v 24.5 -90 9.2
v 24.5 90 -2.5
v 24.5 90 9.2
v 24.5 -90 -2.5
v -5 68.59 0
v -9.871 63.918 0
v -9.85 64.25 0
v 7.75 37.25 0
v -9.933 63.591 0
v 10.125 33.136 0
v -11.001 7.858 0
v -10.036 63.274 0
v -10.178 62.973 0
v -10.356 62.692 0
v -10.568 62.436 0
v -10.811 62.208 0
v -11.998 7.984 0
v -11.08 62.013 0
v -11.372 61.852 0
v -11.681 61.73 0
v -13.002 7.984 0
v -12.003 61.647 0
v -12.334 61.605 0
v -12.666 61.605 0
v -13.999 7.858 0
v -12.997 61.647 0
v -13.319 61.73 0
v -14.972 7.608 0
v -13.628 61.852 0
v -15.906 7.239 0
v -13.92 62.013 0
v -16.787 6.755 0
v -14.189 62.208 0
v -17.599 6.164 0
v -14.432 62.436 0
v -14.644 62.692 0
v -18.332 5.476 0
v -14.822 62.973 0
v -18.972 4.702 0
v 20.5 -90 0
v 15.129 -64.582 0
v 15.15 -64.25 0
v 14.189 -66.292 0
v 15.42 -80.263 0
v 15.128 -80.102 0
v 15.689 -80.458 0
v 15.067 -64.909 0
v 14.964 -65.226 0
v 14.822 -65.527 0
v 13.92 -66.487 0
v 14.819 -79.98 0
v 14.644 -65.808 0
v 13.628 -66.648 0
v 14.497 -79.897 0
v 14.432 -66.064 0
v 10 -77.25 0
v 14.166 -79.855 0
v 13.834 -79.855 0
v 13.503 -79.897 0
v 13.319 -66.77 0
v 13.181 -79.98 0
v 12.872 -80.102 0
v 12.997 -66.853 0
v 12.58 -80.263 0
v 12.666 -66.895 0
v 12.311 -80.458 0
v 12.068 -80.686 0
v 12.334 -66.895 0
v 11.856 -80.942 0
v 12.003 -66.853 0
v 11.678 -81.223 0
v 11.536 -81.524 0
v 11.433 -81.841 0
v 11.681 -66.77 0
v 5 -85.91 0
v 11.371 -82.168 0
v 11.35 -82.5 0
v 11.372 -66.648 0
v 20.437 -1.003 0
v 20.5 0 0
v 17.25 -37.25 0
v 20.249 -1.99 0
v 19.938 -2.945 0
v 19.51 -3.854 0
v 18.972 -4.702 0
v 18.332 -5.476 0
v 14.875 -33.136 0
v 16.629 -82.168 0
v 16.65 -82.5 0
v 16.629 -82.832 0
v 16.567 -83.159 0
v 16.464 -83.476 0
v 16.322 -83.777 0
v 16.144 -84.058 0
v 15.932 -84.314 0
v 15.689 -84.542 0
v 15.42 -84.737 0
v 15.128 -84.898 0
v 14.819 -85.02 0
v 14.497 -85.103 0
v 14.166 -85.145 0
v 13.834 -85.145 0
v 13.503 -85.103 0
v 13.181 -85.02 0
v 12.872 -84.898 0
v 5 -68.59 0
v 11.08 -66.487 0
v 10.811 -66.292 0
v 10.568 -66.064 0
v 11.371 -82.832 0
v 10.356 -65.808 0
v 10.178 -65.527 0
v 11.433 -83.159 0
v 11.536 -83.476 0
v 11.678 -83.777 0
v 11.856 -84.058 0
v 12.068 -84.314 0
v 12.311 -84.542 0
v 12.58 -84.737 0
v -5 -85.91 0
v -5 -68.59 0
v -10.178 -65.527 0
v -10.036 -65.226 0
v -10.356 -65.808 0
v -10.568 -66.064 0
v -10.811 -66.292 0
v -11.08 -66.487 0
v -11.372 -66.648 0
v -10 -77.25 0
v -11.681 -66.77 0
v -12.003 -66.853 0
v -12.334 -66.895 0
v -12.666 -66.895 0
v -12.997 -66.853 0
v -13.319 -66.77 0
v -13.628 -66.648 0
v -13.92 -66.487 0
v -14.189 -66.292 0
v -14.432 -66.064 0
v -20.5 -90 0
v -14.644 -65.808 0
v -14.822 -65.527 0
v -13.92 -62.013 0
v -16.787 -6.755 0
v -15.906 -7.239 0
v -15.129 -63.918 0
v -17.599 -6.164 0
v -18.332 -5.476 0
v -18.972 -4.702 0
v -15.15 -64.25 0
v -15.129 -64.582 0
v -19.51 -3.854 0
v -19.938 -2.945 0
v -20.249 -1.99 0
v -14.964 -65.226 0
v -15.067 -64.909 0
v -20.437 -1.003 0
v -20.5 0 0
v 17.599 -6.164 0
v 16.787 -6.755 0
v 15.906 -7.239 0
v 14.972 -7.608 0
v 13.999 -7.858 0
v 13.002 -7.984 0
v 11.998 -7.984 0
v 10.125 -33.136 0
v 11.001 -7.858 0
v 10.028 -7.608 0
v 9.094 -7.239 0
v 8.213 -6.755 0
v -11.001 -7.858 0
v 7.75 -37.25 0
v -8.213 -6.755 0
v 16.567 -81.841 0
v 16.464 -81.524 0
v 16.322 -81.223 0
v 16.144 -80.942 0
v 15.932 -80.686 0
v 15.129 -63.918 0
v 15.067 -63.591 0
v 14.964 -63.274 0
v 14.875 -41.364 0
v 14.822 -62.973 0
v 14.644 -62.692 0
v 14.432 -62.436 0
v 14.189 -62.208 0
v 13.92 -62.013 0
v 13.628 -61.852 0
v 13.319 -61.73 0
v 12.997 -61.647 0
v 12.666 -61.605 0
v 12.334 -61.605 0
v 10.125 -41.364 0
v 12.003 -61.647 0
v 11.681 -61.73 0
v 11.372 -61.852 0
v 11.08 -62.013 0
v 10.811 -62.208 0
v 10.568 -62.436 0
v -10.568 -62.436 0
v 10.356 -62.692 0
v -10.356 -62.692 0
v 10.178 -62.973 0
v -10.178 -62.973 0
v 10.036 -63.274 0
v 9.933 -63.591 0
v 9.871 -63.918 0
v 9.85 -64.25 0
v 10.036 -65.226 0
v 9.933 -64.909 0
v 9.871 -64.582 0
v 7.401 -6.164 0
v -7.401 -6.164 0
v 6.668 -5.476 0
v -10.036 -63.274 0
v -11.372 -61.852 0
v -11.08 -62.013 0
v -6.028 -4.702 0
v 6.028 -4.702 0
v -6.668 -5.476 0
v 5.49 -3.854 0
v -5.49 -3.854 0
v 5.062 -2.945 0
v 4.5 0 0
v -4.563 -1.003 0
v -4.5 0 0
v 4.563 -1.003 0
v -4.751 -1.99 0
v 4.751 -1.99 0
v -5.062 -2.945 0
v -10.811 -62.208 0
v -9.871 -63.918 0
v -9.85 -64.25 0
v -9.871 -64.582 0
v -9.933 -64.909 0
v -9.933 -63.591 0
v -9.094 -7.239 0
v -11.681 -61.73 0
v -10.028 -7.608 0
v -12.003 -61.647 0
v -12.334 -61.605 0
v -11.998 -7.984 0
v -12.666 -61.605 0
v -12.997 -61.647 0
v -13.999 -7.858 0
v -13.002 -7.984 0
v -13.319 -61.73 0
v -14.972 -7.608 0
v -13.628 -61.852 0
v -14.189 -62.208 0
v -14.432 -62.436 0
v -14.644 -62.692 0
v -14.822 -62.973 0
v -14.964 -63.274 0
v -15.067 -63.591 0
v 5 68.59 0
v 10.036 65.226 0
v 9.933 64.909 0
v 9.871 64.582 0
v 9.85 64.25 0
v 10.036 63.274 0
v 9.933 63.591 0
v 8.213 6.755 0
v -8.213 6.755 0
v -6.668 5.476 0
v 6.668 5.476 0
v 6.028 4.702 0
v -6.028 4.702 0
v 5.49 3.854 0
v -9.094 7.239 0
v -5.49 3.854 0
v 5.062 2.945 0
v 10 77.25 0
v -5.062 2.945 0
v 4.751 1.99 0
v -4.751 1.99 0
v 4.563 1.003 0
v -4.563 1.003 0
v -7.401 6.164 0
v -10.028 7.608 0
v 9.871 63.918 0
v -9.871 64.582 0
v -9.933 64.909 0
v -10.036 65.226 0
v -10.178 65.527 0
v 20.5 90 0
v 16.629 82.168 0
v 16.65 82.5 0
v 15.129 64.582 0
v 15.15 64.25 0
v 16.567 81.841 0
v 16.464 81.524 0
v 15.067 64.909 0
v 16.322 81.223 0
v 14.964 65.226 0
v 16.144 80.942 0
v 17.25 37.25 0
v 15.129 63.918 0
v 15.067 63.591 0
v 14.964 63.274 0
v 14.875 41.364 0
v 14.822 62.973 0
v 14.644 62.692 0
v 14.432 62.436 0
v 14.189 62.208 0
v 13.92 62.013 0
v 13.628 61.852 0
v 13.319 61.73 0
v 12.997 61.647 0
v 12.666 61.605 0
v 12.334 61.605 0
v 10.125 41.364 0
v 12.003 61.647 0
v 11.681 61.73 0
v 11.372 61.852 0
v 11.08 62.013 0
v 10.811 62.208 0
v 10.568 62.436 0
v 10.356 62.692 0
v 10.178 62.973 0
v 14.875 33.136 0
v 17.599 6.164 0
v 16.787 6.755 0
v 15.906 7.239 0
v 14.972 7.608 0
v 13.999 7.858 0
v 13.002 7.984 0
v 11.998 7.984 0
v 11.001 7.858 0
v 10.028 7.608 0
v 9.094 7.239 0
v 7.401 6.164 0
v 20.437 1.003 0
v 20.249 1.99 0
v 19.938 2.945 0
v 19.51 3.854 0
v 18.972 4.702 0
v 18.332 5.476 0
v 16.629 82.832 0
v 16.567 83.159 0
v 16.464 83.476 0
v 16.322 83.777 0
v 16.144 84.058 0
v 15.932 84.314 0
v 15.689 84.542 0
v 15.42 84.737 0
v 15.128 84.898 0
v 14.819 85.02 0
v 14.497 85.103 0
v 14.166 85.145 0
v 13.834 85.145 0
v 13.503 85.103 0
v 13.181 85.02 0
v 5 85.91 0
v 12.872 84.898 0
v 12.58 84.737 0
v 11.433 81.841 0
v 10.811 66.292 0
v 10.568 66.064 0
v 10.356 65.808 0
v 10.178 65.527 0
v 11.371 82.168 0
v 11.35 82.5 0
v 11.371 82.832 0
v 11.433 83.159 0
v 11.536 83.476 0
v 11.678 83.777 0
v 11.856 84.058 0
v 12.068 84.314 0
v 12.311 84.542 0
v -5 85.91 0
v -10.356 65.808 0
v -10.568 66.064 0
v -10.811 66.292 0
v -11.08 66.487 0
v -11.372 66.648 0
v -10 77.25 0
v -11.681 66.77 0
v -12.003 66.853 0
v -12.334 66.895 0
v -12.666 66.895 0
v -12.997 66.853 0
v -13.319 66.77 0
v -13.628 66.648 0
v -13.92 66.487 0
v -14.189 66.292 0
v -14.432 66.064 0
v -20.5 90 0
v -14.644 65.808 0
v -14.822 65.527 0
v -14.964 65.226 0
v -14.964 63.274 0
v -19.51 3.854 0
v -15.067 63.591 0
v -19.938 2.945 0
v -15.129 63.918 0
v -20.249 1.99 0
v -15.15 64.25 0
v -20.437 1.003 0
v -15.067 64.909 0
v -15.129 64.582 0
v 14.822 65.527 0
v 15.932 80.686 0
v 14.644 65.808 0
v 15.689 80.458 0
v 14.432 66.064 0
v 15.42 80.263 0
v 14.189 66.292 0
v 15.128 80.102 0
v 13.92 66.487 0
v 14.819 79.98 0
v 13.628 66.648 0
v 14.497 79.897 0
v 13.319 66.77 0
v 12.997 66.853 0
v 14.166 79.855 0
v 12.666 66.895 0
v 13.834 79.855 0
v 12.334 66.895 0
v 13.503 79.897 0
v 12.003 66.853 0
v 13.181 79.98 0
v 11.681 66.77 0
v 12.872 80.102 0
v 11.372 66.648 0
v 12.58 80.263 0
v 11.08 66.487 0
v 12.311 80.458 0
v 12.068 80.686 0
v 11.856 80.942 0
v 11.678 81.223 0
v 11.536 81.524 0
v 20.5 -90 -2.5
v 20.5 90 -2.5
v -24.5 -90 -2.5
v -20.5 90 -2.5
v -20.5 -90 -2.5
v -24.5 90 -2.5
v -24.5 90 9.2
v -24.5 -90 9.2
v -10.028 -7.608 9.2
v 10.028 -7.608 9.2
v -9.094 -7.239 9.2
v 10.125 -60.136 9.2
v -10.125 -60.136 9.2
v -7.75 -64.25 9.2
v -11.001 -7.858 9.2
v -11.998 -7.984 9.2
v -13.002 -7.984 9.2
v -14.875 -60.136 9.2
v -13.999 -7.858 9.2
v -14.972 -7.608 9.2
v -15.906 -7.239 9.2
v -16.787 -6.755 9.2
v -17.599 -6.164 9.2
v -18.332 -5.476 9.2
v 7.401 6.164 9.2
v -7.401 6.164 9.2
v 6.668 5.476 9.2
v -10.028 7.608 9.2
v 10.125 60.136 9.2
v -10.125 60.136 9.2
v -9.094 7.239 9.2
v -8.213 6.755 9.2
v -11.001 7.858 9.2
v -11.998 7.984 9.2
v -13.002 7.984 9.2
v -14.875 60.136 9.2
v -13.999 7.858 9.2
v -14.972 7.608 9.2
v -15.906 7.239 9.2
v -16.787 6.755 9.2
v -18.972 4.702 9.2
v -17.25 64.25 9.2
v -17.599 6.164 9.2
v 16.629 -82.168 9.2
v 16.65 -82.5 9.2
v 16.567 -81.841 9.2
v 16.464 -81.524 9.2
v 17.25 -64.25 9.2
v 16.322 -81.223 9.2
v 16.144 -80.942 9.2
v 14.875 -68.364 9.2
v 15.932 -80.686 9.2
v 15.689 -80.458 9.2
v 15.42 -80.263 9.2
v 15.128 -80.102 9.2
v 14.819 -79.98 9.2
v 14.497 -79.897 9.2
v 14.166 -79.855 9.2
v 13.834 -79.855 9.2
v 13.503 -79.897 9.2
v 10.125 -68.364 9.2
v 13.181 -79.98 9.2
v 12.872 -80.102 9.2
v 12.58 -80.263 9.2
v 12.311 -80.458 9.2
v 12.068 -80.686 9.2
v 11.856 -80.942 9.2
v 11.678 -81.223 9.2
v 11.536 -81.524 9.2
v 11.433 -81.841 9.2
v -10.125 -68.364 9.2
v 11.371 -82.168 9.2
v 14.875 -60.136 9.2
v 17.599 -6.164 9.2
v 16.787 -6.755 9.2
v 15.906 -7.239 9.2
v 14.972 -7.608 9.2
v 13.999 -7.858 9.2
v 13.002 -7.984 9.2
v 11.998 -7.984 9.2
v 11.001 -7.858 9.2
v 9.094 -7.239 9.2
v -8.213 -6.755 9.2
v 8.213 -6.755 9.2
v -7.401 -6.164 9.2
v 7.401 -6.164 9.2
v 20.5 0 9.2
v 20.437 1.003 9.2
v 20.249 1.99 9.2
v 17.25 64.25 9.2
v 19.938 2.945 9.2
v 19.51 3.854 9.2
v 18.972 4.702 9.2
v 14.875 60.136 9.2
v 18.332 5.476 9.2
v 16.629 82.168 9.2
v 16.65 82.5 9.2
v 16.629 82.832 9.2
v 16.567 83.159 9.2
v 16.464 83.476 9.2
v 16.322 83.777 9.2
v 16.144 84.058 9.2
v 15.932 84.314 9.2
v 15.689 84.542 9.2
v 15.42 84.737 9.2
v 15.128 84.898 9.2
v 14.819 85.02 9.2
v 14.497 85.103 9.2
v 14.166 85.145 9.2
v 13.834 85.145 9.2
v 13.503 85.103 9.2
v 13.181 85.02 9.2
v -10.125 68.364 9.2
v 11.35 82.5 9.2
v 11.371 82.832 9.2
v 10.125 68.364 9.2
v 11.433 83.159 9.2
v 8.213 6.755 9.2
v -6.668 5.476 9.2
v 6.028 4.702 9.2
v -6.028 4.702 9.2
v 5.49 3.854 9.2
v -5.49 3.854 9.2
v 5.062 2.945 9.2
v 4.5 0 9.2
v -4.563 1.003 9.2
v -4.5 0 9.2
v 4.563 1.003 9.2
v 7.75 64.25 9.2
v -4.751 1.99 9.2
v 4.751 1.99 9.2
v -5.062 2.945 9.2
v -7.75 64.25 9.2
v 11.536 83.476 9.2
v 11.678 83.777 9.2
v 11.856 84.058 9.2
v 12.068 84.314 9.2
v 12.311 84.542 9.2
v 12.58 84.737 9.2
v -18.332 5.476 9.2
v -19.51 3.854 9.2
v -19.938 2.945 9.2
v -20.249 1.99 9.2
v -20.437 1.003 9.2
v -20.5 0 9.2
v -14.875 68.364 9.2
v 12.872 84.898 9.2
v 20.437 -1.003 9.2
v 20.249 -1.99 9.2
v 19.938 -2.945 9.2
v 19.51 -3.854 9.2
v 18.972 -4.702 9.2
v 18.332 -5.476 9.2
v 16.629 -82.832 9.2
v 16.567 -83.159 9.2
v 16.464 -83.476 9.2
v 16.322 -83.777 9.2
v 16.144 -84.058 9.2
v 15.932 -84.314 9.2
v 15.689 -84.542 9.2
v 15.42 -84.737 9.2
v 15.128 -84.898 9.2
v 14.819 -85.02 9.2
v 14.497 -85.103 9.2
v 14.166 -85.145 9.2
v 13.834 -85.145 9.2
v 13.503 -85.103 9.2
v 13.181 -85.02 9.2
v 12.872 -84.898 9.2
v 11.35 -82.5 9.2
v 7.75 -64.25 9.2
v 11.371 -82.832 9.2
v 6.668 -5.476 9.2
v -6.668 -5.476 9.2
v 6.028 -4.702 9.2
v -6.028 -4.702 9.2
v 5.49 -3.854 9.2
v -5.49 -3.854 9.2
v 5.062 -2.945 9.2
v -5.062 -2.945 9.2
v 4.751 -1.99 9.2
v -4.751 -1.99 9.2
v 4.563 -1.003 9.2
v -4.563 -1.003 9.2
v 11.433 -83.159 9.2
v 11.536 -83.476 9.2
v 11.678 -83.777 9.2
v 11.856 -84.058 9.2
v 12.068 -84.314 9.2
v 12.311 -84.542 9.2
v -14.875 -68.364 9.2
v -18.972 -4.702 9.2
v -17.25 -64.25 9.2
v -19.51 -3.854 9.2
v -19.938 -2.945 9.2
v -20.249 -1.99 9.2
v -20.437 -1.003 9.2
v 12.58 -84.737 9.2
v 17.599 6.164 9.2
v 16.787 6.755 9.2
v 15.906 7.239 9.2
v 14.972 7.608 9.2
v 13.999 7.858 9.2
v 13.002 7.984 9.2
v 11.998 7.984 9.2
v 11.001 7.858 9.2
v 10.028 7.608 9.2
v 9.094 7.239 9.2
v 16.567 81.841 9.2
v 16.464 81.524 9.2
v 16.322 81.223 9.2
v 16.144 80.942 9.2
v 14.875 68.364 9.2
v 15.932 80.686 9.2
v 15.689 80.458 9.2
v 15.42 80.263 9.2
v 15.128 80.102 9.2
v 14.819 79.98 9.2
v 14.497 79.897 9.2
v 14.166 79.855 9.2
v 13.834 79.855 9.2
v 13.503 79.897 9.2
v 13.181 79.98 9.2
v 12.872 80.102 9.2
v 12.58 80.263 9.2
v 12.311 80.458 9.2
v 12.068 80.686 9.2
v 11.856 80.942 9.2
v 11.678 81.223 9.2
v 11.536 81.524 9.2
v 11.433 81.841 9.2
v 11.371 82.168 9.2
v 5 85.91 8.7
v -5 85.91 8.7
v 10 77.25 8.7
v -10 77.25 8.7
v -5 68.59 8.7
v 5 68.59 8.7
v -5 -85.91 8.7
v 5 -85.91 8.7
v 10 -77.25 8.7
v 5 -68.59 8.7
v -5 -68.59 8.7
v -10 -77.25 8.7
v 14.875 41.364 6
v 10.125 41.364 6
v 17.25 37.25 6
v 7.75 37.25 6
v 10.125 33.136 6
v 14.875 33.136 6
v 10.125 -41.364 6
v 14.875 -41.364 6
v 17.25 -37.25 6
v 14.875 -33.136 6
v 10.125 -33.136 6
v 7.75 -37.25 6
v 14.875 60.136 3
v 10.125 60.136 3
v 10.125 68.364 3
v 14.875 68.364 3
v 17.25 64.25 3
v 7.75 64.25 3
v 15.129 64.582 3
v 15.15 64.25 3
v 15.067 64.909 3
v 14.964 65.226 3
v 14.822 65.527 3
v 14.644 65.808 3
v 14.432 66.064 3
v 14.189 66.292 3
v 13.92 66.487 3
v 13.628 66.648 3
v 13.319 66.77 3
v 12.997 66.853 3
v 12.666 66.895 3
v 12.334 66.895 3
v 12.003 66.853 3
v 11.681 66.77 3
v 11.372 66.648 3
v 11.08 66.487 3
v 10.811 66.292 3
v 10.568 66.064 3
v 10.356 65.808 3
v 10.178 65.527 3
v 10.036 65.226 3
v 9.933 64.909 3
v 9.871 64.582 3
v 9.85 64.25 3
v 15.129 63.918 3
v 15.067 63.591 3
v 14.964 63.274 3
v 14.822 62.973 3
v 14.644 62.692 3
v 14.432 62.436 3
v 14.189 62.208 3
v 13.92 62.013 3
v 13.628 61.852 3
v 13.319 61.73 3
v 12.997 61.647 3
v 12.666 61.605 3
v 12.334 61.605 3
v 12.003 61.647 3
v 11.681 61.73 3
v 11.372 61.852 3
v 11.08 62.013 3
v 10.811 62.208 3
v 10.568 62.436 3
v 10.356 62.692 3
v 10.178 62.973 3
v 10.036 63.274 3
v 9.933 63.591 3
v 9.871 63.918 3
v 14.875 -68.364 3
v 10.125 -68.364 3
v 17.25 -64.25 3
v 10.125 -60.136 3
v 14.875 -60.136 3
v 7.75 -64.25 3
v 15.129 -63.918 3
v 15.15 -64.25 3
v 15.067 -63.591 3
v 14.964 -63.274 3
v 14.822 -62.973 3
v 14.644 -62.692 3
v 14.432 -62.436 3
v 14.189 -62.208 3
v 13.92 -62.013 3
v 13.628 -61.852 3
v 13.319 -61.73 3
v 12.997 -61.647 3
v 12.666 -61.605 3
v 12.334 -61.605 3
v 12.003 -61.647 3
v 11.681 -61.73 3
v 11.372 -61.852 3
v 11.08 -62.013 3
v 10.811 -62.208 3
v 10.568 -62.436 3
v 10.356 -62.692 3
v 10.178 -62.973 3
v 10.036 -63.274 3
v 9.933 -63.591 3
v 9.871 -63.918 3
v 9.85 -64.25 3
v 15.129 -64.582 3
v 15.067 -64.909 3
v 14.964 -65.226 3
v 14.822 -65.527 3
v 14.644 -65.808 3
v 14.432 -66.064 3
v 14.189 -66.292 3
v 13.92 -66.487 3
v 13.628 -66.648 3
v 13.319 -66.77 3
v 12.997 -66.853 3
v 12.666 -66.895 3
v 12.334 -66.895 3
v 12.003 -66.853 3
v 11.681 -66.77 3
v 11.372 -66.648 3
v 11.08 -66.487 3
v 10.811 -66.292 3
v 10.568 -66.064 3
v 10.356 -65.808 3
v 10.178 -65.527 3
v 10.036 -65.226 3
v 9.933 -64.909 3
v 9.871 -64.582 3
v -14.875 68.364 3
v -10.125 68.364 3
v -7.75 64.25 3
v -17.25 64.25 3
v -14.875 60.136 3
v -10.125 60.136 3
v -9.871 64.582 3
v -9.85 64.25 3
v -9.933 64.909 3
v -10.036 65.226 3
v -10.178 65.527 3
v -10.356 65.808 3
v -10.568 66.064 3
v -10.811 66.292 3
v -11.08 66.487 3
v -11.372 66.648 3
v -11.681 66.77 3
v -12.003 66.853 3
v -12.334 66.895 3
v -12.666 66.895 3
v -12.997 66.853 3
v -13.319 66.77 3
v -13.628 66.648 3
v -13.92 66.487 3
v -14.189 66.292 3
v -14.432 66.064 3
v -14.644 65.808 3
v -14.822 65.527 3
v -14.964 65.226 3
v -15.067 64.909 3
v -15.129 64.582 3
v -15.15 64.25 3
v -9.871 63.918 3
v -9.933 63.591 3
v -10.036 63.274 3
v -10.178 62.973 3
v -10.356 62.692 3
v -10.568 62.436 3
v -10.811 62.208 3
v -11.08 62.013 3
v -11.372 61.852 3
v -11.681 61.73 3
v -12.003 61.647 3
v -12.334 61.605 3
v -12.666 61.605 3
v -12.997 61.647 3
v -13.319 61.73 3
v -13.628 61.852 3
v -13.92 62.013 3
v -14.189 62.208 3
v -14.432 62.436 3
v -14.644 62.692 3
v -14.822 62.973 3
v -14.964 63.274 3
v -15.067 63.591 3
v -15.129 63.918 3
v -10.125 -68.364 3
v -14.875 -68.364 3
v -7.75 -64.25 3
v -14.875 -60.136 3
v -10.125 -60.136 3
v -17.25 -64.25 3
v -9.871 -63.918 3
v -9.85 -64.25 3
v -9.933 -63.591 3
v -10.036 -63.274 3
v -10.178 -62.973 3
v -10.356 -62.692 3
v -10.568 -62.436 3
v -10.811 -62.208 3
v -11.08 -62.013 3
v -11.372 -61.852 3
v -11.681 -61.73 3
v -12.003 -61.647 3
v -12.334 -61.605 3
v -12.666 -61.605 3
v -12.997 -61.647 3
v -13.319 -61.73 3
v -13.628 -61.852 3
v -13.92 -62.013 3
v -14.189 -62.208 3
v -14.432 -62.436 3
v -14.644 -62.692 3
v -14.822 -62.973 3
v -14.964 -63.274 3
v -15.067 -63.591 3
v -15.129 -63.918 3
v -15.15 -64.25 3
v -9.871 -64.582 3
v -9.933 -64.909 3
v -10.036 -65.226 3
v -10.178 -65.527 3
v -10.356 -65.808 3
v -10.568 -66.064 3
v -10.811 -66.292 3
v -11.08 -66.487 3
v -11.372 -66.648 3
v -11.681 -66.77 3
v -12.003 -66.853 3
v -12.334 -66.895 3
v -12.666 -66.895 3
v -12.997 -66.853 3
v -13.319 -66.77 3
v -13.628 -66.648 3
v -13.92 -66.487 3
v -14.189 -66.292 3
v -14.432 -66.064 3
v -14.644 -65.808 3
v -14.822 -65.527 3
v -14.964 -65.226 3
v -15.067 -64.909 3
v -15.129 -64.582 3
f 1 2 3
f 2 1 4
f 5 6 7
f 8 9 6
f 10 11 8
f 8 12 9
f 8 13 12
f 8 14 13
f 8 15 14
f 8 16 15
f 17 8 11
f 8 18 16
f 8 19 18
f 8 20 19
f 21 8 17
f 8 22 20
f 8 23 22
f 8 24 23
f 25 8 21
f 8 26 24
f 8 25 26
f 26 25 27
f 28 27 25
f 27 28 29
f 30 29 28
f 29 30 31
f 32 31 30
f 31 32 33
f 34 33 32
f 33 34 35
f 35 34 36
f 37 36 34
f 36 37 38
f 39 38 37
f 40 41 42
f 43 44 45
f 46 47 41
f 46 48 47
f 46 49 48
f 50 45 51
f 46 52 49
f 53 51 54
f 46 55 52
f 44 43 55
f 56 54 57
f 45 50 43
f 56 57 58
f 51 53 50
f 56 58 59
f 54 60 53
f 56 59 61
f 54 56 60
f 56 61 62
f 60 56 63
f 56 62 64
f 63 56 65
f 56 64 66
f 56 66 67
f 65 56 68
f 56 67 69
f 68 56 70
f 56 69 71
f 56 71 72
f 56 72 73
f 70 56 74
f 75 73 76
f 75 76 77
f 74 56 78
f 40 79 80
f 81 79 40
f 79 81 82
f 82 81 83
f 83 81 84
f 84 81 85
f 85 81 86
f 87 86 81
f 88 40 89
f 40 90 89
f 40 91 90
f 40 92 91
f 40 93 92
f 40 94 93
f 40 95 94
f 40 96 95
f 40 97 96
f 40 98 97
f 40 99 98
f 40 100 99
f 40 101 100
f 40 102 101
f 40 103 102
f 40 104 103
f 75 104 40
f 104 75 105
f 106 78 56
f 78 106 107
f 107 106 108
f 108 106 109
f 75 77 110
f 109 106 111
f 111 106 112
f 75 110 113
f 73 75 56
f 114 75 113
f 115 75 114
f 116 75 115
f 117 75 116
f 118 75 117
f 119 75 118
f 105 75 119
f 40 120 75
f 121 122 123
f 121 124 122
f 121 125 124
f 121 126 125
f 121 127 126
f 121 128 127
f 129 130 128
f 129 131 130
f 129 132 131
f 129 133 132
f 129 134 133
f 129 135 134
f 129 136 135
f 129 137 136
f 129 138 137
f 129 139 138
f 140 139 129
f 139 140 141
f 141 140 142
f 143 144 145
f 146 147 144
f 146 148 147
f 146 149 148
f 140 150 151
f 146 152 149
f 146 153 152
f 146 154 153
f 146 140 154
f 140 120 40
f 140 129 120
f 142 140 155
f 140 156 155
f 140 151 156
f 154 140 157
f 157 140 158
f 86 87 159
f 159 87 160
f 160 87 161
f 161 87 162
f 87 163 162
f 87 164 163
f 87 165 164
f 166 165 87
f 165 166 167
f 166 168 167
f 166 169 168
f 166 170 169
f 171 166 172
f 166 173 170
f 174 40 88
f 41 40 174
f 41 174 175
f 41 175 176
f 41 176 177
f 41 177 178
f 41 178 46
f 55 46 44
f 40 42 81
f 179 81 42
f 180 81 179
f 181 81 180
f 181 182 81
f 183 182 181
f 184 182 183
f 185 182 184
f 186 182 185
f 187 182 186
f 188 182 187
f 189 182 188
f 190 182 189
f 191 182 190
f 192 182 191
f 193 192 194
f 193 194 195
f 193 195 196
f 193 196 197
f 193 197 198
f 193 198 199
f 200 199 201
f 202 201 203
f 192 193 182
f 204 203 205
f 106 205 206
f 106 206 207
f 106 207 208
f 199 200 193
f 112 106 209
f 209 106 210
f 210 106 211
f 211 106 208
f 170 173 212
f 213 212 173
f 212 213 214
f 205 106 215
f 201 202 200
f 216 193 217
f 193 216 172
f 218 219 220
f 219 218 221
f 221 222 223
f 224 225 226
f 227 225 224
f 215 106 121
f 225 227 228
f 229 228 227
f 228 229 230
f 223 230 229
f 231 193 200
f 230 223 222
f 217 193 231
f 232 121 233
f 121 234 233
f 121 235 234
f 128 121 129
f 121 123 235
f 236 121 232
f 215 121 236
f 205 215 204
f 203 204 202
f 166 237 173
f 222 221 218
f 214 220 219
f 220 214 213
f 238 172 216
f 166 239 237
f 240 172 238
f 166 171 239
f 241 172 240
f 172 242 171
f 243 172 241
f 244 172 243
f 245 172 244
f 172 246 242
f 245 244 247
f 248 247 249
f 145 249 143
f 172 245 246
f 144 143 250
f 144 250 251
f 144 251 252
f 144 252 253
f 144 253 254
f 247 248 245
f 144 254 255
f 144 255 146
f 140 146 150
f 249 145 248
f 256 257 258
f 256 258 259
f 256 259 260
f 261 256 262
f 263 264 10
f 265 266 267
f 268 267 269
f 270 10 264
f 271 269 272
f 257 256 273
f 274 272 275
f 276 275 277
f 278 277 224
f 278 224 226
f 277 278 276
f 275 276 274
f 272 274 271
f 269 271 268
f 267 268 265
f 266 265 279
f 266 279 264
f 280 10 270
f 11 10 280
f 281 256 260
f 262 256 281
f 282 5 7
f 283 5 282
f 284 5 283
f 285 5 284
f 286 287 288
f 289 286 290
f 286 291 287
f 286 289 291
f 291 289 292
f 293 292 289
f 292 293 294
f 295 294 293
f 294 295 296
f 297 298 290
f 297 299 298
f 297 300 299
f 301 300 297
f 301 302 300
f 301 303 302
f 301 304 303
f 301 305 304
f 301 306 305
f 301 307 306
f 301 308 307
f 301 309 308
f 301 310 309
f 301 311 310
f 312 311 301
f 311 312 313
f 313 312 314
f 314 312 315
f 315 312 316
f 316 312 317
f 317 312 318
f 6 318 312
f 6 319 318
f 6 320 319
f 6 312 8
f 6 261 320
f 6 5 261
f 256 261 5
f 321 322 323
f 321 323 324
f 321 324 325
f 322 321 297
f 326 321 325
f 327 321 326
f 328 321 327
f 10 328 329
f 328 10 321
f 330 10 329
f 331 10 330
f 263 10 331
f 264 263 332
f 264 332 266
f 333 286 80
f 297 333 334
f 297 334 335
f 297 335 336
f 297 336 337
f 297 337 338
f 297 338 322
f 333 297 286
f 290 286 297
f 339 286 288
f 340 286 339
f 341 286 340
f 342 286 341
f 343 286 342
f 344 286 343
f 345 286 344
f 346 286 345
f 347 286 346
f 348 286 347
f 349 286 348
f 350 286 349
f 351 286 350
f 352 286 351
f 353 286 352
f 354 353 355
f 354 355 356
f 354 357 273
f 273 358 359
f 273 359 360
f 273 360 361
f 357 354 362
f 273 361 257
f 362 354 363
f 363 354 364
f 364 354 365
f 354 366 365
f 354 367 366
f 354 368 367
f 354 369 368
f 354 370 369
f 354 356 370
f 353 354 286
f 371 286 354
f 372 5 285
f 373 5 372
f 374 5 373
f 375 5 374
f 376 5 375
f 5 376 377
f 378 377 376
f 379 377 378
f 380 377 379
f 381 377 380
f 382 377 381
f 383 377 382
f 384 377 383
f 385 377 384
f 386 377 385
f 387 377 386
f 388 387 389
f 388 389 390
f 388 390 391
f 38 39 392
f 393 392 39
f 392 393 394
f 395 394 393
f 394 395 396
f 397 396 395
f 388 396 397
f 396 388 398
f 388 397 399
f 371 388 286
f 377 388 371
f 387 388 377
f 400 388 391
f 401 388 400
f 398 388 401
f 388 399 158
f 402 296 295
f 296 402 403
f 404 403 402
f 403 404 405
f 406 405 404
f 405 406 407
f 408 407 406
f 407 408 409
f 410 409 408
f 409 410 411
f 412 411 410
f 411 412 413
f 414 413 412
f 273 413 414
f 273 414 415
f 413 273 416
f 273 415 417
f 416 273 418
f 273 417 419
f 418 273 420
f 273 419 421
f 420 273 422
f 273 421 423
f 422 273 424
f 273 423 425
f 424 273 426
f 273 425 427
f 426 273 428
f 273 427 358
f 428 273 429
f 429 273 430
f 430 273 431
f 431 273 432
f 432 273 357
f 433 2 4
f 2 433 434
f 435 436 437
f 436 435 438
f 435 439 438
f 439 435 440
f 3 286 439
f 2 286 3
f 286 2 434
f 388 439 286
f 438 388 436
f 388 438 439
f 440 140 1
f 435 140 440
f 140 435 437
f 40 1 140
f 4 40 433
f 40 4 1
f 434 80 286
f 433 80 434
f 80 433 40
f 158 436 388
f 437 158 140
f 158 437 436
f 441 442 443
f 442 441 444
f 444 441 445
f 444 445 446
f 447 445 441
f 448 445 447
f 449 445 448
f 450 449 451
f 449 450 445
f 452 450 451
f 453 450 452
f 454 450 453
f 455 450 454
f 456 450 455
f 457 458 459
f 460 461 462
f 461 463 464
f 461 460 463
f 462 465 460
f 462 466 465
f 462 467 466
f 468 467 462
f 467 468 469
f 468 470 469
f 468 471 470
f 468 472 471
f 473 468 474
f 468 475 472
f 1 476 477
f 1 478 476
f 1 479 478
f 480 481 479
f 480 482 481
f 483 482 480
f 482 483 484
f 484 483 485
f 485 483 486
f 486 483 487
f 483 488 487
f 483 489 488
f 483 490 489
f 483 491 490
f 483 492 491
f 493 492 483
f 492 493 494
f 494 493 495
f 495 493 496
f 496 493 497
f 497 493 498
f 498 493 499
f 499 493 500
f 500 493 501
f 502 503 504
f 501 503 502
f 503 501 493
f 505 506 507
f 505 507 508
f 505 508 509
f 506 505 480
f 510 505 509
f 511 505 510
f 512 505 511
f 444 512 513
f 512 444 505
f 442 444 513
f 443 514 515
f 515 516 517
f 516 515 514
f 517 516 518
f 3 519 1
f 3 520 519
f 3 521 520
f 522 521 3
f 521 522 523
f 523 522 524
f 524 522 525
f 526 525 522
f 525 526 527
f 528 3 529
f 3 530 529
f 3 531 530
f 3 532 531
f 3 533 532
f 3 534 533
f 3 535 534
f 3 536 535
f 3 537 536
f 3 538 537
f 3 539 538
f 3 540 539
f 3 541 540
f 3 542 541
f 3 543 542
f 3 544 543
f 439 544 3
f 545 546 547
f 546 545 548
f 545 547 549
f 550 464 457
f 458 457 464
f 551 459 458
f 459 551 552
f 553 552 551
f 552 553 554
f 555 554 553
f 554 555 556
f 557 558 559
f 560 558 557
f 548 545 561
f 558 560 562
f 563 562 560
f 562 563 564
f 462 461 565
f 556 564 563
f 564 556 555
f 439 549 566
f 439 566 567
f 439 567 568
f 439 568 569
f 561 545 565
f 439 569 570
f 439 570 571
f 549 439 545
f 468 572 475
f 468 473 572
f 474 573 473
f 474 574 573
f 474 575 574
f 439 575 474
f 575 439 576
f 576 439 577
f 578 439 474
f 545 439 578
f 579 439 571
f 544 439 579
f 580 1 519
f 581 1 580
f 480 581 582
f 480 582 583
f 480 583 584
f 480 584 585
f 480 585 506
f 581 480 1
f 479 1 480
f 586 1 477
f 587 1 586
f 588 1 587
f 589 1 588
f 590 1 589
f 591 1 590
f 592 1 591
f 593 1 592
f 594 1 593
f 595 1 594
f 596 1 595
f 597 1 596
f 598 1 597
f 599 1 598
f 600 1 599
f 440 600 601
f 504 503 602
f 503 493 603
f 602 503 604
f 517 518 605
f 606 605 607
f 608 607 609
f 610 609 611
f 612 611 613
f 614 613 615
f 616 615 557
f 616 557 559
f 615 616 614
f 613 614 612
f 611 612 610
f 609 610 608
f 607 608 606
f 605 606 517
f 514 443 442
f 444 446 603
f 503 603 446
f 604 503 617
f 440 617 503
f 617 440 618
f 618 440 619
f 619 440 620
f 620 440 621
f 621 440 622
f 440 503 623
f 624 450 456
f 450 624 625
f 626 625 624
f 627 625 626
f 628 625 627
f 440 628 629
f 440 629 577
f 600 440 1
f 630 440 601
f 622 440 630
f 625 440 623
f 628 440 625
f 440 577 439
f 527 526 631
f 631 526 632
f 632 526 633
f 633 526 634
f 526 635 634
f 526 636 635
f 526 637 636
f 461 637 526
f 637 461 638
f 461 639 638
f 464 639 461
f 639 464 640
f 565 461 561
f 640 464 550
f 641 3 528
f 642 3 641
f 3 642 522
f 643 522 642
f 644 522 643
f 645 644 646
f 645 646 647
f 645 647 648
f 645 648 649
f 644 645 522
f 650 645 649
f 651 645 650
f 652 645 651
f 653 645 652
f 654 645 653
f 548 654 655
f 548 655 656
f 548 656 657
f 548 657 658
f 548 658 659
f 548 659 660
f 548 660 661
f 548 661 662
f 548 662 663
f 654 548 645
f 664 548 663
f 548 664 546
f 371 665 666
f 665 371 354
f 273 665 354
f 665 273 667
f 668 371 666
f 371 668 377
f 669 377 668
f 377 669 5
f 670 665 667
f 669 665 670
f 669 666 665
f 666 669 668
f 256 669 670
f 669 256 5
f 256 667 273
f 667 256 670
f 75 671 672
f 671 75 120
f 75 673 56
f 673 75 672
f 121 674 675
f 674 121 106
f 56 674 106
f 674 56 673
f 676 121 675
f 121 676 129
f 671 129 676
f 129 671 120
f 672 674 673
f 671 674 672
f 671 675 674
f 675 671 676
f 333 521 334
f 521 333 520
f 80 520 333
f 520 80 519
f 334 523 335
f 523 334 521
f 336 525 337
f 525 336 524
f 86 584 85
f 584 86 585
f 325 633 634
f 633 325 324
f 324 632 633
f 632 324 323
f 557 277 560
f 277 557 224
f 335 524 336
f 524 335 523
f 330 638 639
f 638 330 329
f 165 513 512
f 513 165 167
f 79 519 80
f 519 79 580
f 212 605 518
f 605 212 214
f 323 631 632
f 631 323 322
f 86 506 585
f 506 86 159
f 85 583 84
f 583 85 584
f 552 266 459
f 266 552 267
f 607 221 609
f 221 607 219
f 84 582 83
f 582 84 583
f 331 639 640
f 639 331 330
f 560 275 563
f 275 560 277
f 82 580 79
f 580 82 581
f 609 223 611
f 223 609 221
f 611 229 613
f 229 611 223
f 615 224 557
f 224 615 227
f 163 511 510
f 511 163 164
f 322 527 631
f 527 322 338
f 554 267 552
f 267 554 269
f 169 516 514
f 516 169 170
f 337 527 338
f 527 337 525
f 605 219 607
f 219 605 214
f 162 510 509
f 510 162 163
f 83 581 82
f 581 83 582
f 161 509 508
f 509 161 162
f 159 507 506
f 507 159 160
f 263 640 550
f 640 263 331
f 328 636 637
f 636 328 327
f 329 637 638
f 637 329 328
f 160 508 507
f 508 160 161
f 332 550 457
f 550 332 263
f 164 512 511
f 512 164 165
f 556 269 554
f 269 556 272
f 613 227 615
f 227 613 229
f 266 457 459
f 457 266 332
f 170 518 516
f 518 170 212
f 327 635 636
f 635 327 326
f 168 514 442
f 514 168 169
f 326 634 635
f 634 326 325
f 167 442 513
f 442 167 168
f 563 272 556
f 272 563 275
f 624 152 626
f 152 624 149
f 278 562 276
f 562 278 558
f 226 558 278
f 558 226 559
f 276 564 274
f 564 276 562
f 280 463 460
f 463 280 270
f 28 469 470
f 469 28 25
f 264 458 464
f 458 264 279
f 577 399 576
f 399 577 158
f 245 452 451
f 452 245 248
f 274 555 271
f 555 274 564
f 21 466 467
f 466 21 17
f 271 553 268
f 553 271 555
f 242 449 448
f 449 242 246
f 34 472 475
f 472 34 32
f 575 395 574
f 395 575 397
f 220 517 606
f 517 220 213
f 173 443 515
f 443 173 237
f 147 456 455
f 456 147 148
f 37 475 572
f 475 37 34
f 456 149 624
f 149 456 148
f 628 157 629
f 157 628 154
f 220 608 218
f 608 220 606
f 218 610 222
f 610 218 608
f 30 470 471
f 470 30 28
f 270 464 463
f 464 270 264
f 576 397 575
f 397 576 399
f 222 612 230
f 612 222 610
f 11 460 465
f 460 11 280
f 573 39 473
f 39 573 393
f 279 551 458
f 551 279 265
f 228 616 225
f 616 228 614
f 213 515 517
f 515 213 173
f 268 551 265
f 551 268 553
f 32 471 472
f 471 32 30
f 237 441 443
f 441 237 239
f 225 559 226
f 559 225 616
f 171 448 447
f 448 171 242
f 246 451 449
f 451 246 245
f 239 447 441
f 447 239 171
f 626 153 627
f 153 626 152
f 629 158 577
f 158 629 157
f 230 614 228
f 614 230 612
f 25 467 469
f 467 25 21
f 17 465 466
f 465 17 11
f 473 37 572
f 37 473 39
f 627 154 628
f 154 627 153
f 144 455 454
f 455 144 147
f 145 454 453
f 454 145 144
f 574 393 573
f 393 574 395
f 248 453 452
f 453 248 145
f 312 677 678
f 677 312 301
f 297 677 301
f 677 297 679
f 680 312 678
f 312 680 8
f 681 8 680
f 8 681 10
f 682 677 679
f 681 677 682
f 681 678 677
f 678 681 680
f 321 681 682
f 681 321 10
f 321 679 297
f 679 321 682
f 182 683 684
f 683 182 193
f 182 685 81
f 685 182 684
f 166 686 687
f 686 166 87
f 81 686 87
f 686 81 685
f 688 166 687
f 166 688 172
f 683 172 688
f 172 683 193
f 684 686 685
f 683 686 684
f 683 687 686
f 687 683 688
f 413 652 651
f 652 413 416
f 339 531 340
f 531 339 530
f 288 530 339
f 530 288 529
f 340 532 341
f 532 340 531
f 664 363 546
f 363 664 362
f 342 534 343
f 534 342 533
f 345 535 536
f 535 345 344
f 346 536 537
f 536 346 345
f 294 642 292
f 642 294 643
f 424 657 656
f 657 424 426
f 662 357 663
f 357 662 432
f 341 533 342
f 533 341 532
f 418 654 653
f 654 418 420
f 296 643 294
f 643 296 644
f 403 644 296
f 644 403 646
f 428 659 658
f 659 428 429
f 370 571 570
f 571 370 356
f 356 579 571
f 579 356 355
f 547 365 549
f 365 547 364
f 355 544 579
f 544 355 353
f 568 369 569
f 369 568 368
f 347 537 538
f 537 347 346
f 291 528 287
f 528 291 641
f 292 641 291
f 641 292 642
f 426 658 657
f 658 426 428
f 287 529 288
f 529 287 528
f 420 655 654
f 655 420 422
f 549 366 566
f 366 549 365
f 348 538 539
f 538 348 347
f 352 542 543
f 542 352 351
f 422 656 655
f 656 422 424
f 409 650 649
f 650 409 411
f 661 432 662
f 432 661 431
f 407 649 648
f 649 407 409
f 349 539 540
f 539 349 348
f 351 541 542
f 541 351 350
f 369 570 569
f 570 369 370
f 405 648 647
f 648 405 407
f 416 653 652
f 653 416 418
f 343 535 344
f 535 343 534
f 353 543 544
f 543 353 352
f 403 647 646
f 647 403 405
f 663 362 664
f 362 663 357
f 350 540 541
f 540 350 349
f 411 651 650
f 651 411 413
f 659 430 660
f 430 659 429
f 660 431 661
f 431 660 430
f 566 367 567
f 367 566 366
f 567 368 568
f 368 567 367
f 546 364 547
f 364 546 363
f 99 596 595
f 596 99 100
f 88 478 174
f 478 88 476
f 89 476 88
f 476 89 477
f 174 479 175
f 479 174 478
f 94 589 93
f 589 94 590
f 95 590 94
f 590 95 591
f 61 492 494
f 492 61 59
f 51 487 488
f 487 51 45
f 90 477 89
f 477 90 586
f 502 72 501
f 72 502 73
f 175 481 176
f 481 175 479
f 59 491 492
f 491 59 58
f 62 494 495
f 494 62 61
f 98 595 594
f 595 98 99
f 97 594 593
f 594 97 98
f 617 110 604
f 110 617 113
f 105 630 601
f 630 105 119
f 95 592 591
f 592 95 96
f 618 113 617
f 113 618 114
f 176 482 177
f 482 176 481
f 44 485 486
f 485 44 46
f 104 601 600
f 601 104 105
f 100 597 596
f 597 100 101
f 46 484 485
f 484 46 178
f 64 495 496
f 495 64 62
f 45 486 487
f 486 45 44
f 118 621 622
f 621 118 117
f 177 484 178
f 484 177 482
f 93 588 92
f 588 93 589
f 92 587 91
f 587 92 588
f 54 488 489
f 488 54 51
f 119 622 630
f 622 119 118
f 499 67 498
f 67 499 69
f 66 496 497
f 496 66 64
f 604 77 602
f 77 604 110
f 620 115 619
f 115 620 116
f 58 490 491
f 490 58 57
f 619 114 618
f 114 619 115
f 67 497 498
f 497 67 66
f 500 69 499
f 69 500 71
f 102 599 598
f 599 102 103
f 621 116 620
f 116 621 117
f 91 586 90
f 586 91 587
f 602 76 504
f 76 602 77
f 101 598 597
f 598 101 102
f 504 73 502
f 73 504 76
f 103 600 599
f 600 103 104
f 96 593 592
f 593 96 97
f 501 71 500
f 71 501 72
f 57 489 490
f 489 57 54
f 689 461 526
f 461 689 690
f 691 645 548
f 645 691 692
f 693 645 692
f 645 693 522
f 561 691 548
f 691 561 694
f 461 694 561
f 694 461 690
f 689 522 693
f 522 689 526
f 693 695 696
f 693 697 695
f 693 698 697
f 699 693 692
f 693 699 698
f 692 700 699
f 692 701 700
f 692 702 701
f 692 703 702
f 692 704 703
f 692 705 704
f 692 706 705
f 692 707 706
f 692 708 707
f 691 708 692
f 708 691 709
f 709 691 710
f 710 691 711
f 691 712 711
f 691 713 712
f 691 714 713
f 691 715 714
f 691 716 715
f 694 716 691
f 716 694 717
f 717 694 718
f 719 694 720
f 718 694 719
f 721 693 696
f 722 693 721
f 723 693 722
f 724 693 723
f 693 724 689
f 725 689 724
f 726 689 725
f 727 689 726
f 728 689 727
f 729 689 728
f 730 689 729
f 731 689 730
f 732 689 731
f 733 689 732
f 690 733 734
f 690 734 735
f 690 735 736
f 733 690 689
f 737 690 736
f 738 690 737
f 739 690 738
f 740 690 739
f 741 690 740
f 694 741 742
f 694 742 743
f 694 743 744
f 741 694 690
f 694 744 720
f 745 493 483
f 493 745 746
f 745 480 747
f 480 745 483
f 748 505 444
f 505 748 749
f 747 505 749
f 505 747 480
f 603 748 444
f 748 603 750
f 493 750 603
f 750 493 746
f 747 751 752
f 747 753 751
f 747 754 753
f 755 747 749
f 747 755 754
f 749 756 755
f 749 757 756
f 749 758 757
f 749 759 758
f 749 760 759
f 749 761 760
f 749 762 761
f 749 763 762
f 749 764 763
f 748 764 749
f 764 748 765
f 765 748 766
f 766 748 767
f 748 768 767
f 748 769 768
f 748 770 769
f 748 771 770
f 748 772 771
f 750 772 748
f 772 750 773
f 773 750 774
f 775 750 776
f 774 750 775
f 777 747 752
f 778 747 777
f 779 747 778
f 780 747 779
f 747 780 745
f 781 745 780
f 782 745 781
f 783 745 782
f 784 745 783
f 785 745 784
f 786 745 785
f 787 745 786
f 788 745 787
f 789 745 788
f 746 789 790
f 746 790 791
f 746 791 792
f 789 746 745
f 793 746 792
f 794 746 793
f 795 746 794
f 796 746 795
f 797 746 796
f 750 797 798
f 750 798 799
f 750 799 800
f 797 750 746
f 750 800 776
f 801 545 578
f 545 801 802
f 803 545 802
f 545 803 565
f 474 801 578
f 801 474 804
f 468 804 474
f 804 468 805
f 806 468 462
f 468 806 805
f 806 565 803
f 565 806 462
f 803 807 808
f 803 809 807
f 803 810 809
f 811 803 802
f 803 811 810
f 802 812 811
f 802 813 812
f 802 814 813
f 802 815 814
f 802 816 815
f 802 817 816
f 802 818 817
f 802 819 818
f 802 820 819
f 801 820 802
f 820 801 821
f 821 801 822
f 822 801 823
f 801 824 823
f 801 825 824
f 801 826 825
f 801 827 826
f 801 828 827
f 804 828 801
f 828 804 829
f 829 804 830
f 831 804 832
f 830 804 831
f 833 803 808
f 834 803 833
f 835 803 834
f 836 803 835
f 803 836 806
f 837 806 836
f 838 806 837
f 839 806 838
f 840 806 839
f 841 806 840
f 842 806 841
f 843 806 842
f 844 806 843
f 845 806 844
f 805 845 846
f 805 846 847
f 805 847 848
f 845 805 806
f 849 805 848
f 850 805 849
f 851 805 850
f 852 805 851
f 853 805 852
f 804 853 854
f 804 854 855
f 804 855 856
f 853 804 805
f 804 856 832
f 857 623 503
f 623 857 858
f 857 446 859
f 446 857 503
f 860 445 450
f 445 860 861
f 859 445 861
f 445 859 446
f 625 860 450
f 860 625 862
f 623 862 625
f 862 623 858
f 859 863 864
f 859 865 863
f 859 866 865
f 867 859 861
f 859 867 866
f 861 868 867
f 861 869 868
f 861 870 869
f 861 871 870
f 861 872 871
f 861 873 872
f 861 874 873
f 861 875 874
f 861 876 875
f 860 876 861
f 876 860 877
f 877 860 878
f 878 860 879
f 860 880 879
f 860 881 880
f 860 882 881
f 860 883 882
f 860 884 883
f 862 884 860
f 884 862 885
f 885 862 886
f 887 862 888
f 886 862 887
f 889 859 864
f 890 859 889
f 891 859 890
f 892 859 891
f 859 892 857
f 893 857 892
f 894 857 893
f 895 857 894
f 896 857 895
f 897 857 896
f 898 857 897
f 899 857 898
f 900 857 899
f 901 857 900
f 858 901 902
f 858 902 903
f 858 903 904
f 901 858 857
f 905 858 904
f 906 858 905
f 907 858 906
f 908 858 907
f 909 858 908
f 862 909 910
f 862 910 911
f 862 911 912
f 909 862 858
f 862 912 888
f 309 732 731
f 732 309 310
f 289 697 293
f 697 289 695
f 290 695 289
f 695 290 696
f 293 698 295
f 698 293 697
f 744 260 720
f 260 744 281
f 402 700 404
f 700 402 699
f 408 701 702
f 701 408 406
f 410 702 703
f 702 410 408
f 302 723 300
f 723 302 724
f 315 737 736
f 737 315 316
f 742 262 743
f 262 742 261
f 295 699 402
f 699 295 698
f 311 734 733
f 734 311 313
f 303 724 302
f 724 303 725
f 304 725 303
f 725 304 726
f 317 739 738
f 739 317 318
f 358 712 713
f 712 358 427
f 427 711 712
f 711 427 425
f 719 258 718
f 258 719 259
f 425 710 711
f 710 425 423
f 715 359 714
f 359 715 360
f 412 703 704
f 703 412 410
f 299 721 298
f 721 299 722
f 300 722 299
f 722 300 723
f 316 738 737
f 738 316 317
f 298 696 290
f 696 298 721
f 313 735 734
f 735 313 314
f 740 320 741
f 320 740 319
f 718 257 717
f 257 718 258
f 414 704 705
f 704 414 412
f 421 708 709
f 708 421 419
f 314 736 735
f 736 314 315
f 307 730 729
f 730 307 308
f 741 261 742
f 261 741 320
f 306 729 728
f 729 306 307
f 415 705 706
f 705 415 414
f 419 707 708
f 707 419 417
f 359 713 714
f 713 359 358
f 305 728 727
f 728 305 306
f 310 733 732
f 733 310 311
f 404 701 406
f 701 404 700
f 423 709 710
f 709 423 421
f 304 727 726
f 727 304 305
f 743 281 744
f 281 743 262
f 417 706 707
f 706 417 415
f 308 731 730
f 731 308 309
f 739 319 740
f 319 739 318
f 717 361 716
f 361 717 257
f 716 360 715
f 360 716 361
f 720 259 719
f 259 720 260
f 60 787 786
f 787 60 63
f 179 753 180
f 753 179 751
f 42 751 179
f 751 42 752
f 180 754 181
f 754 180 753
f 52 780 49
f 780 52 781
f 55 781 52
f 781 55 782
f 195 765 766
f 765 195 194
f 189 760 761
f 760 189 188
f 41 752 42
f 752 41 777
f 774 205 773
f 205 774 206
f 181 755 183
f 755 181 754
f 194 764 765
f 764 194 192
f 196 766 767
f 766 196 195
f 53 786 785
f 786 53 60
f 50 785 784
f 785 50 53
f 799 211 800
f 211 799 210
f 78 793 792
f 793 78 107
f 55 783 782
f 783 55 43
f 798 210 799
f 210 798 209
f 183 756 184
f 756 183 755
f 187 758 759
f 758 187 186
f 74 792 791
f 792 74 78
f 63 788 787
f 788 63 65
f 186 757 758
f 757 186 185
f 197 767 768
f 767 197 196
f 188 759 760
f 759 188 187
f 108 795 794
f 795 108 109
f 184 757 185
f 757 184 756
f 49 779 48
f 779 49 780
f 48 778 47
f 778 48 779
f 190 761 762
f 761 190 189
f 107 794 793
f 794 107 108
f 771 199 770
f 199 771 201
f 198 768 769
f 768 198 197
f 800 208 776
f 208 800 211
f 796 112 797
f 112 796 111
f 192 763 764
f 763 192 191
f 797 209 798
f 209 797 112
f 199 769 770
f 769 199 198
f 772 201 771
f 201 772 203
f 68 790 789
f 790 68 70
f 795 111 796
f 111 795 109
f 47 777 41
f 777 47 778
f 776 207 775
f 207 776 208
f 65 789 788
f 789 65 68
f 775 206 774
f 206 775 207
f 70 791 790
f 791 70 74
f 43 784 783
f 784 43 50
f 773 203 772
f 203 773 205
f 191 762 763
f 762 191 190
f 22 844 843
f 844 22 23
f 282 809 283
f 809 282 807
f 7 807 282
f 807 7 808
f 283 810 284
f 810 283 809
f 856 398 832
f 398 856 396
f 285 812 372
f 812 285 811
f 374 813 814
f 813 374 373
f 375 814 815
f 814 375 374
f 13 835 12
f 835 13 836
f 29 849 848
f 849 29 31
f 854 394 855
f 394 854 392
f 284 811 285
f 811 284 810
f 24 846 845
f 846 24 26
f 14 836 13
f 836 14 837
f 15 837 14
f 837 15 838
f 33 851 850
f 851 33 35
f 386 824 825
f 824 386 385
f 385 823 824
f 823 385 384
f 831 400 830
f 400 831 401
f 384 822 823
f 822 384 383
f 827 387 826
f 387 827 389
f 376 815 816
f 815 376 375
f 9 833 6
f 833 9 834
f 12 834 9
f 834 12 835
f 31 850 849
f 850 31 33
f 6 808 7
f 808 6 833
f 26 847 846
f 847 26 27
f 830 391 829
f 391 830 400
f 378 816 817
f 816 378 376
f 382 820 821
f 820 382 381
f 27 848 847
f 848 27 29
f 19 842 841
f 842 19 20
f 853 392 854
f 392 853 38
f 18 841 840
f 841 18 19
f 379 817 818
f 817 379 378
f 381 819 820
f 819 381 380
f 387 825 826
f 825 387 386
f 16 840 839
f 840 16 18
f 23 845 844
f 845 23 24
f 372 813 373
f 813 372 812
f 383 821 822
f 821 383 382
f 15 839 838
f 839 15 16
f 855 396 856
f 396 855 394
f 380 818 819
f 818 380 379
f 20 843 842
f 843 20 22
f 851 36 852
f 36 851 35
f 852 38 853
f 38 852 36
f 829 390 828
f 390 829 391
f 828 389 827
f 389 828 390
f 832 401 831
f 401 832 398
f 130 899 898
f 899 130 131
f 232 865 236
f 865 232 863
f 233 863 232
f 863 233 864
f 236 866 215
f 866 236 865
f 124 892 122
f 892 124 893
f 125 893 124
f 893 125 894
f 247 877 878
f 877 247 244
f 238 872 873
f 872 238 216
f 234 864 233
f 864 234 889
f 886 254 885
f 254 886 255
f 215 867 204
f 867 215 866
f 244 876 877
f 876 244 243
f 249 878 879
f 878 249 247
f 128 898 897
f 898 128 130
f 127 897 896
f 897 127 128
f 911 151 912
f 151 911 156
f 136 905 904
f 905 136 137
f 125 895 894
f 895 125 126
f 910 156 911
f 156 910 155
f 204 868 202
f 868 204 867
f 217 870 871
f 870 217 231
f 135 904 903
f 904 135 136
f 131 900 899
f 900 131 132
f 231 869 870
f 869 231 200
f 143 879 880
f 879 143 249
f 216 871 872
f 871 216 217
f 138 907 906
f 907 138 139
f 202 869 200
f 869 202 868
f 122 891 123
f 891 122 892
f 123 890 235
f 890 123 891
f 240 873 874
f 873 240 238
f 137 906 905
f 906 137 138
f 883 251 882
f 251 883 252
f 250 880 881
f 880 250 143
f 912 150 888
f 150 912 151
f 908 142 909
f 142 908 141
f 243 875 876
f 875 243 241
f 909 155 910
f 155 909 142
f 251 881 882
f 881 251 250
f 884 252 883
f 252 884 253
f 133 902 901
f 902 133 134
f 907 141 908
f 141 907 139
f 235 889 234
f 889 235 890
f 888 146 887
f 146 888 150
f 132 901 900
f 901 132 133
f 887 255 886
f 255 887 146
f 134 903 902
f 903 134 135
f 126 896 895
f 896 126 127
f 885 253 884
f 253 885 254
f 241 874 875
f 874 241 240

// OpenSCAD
a = 41;
b = 180;
tloustkaOkraju = 4;
vyskaDesticky=2.5;

translate([0,0,-vyskaDesticky/2])
difference(){
cube([a+2*tloustkaOkraju, b, vyskaDesticky],center = true);
cube([a,b,vyskaDesticky+0.01], center = true);
}


vyskaMatky = 9.2;
difference(){
translate([0,0,vyskaMatky/2])
cube([a+2*tloustkaOkraju,b,vyskaMatky],center = true);
// nohy
 polomerVelke= 20/2;

translate([0,76.5+0.75,0]) cylinder(h=8.7,r=polomerVelke, $fn=6);
translate([0,-76.5-0.75,0])cylinder(h=8.7,r=polomerVelke, $fn=6);

// stred
polomerMale = 13/2;
translate([12.5,0,0])cylinder(h=vyskaMatky, r = polomerMale+1.5,$fn = 50);
translate([-12.5,0,0])cylinder(h=vyskaMatky, r = polomerMale+1.5,$fn = 50);
// na motor
polomerMensi = 9.5/2;
translate([12.5,36.5+0.75,0])cylinder(h=6, r=polomerMensi,$fn=6);
translate([12.5,-36.5-0.75,0])cylinder(h=6, r=polomerMensi,$fn=6);
    
// na plech

translate([14,165/2,0])cylinder(h=vyskaMatky, r=5.3/2,$fn=50);
translate([14,-165/2,0])cylinder(h=vyskaMatky, r=5.3/2,$fn=50);

// prichyceni desticky
translate([12.5,63.5+0.75,3])cylinder(h=vyskaMatky, r = polomerMensi,$fn = 6);
translate([12.5,-63.5-0.75,3])cylinder(h=vyskaMatky, r = polomerMensi,$fn = 6);
translate([-12.5,63.5+0.75,3])cylinder(h=vyskaMatky, r = polomerMensi,$fn = 6);
translate([-12.5,-63.5-0.75,3])cylinder(h=vyskaMatky, r = polomerMensi,$fn = 6);

translate([12.5,63.5+0.75,0])cylinder(h=vyskaMatky, r = 5.3/2,$fn = 50);
translate([12.5,-63.5-0.75,0])cylinder(h=vyskaMatky, r = 5.3/2,$fn = 50);
translate([-12.5,63.5+0.75,0])cylinder(h=vyskaMatky, r = 5.3/2,$fn = 50);
translate([-12.5,-63.5-0.75,0])cylinder(h=vyskaMatky, r = 5.3/2,$fn = 50);
}
